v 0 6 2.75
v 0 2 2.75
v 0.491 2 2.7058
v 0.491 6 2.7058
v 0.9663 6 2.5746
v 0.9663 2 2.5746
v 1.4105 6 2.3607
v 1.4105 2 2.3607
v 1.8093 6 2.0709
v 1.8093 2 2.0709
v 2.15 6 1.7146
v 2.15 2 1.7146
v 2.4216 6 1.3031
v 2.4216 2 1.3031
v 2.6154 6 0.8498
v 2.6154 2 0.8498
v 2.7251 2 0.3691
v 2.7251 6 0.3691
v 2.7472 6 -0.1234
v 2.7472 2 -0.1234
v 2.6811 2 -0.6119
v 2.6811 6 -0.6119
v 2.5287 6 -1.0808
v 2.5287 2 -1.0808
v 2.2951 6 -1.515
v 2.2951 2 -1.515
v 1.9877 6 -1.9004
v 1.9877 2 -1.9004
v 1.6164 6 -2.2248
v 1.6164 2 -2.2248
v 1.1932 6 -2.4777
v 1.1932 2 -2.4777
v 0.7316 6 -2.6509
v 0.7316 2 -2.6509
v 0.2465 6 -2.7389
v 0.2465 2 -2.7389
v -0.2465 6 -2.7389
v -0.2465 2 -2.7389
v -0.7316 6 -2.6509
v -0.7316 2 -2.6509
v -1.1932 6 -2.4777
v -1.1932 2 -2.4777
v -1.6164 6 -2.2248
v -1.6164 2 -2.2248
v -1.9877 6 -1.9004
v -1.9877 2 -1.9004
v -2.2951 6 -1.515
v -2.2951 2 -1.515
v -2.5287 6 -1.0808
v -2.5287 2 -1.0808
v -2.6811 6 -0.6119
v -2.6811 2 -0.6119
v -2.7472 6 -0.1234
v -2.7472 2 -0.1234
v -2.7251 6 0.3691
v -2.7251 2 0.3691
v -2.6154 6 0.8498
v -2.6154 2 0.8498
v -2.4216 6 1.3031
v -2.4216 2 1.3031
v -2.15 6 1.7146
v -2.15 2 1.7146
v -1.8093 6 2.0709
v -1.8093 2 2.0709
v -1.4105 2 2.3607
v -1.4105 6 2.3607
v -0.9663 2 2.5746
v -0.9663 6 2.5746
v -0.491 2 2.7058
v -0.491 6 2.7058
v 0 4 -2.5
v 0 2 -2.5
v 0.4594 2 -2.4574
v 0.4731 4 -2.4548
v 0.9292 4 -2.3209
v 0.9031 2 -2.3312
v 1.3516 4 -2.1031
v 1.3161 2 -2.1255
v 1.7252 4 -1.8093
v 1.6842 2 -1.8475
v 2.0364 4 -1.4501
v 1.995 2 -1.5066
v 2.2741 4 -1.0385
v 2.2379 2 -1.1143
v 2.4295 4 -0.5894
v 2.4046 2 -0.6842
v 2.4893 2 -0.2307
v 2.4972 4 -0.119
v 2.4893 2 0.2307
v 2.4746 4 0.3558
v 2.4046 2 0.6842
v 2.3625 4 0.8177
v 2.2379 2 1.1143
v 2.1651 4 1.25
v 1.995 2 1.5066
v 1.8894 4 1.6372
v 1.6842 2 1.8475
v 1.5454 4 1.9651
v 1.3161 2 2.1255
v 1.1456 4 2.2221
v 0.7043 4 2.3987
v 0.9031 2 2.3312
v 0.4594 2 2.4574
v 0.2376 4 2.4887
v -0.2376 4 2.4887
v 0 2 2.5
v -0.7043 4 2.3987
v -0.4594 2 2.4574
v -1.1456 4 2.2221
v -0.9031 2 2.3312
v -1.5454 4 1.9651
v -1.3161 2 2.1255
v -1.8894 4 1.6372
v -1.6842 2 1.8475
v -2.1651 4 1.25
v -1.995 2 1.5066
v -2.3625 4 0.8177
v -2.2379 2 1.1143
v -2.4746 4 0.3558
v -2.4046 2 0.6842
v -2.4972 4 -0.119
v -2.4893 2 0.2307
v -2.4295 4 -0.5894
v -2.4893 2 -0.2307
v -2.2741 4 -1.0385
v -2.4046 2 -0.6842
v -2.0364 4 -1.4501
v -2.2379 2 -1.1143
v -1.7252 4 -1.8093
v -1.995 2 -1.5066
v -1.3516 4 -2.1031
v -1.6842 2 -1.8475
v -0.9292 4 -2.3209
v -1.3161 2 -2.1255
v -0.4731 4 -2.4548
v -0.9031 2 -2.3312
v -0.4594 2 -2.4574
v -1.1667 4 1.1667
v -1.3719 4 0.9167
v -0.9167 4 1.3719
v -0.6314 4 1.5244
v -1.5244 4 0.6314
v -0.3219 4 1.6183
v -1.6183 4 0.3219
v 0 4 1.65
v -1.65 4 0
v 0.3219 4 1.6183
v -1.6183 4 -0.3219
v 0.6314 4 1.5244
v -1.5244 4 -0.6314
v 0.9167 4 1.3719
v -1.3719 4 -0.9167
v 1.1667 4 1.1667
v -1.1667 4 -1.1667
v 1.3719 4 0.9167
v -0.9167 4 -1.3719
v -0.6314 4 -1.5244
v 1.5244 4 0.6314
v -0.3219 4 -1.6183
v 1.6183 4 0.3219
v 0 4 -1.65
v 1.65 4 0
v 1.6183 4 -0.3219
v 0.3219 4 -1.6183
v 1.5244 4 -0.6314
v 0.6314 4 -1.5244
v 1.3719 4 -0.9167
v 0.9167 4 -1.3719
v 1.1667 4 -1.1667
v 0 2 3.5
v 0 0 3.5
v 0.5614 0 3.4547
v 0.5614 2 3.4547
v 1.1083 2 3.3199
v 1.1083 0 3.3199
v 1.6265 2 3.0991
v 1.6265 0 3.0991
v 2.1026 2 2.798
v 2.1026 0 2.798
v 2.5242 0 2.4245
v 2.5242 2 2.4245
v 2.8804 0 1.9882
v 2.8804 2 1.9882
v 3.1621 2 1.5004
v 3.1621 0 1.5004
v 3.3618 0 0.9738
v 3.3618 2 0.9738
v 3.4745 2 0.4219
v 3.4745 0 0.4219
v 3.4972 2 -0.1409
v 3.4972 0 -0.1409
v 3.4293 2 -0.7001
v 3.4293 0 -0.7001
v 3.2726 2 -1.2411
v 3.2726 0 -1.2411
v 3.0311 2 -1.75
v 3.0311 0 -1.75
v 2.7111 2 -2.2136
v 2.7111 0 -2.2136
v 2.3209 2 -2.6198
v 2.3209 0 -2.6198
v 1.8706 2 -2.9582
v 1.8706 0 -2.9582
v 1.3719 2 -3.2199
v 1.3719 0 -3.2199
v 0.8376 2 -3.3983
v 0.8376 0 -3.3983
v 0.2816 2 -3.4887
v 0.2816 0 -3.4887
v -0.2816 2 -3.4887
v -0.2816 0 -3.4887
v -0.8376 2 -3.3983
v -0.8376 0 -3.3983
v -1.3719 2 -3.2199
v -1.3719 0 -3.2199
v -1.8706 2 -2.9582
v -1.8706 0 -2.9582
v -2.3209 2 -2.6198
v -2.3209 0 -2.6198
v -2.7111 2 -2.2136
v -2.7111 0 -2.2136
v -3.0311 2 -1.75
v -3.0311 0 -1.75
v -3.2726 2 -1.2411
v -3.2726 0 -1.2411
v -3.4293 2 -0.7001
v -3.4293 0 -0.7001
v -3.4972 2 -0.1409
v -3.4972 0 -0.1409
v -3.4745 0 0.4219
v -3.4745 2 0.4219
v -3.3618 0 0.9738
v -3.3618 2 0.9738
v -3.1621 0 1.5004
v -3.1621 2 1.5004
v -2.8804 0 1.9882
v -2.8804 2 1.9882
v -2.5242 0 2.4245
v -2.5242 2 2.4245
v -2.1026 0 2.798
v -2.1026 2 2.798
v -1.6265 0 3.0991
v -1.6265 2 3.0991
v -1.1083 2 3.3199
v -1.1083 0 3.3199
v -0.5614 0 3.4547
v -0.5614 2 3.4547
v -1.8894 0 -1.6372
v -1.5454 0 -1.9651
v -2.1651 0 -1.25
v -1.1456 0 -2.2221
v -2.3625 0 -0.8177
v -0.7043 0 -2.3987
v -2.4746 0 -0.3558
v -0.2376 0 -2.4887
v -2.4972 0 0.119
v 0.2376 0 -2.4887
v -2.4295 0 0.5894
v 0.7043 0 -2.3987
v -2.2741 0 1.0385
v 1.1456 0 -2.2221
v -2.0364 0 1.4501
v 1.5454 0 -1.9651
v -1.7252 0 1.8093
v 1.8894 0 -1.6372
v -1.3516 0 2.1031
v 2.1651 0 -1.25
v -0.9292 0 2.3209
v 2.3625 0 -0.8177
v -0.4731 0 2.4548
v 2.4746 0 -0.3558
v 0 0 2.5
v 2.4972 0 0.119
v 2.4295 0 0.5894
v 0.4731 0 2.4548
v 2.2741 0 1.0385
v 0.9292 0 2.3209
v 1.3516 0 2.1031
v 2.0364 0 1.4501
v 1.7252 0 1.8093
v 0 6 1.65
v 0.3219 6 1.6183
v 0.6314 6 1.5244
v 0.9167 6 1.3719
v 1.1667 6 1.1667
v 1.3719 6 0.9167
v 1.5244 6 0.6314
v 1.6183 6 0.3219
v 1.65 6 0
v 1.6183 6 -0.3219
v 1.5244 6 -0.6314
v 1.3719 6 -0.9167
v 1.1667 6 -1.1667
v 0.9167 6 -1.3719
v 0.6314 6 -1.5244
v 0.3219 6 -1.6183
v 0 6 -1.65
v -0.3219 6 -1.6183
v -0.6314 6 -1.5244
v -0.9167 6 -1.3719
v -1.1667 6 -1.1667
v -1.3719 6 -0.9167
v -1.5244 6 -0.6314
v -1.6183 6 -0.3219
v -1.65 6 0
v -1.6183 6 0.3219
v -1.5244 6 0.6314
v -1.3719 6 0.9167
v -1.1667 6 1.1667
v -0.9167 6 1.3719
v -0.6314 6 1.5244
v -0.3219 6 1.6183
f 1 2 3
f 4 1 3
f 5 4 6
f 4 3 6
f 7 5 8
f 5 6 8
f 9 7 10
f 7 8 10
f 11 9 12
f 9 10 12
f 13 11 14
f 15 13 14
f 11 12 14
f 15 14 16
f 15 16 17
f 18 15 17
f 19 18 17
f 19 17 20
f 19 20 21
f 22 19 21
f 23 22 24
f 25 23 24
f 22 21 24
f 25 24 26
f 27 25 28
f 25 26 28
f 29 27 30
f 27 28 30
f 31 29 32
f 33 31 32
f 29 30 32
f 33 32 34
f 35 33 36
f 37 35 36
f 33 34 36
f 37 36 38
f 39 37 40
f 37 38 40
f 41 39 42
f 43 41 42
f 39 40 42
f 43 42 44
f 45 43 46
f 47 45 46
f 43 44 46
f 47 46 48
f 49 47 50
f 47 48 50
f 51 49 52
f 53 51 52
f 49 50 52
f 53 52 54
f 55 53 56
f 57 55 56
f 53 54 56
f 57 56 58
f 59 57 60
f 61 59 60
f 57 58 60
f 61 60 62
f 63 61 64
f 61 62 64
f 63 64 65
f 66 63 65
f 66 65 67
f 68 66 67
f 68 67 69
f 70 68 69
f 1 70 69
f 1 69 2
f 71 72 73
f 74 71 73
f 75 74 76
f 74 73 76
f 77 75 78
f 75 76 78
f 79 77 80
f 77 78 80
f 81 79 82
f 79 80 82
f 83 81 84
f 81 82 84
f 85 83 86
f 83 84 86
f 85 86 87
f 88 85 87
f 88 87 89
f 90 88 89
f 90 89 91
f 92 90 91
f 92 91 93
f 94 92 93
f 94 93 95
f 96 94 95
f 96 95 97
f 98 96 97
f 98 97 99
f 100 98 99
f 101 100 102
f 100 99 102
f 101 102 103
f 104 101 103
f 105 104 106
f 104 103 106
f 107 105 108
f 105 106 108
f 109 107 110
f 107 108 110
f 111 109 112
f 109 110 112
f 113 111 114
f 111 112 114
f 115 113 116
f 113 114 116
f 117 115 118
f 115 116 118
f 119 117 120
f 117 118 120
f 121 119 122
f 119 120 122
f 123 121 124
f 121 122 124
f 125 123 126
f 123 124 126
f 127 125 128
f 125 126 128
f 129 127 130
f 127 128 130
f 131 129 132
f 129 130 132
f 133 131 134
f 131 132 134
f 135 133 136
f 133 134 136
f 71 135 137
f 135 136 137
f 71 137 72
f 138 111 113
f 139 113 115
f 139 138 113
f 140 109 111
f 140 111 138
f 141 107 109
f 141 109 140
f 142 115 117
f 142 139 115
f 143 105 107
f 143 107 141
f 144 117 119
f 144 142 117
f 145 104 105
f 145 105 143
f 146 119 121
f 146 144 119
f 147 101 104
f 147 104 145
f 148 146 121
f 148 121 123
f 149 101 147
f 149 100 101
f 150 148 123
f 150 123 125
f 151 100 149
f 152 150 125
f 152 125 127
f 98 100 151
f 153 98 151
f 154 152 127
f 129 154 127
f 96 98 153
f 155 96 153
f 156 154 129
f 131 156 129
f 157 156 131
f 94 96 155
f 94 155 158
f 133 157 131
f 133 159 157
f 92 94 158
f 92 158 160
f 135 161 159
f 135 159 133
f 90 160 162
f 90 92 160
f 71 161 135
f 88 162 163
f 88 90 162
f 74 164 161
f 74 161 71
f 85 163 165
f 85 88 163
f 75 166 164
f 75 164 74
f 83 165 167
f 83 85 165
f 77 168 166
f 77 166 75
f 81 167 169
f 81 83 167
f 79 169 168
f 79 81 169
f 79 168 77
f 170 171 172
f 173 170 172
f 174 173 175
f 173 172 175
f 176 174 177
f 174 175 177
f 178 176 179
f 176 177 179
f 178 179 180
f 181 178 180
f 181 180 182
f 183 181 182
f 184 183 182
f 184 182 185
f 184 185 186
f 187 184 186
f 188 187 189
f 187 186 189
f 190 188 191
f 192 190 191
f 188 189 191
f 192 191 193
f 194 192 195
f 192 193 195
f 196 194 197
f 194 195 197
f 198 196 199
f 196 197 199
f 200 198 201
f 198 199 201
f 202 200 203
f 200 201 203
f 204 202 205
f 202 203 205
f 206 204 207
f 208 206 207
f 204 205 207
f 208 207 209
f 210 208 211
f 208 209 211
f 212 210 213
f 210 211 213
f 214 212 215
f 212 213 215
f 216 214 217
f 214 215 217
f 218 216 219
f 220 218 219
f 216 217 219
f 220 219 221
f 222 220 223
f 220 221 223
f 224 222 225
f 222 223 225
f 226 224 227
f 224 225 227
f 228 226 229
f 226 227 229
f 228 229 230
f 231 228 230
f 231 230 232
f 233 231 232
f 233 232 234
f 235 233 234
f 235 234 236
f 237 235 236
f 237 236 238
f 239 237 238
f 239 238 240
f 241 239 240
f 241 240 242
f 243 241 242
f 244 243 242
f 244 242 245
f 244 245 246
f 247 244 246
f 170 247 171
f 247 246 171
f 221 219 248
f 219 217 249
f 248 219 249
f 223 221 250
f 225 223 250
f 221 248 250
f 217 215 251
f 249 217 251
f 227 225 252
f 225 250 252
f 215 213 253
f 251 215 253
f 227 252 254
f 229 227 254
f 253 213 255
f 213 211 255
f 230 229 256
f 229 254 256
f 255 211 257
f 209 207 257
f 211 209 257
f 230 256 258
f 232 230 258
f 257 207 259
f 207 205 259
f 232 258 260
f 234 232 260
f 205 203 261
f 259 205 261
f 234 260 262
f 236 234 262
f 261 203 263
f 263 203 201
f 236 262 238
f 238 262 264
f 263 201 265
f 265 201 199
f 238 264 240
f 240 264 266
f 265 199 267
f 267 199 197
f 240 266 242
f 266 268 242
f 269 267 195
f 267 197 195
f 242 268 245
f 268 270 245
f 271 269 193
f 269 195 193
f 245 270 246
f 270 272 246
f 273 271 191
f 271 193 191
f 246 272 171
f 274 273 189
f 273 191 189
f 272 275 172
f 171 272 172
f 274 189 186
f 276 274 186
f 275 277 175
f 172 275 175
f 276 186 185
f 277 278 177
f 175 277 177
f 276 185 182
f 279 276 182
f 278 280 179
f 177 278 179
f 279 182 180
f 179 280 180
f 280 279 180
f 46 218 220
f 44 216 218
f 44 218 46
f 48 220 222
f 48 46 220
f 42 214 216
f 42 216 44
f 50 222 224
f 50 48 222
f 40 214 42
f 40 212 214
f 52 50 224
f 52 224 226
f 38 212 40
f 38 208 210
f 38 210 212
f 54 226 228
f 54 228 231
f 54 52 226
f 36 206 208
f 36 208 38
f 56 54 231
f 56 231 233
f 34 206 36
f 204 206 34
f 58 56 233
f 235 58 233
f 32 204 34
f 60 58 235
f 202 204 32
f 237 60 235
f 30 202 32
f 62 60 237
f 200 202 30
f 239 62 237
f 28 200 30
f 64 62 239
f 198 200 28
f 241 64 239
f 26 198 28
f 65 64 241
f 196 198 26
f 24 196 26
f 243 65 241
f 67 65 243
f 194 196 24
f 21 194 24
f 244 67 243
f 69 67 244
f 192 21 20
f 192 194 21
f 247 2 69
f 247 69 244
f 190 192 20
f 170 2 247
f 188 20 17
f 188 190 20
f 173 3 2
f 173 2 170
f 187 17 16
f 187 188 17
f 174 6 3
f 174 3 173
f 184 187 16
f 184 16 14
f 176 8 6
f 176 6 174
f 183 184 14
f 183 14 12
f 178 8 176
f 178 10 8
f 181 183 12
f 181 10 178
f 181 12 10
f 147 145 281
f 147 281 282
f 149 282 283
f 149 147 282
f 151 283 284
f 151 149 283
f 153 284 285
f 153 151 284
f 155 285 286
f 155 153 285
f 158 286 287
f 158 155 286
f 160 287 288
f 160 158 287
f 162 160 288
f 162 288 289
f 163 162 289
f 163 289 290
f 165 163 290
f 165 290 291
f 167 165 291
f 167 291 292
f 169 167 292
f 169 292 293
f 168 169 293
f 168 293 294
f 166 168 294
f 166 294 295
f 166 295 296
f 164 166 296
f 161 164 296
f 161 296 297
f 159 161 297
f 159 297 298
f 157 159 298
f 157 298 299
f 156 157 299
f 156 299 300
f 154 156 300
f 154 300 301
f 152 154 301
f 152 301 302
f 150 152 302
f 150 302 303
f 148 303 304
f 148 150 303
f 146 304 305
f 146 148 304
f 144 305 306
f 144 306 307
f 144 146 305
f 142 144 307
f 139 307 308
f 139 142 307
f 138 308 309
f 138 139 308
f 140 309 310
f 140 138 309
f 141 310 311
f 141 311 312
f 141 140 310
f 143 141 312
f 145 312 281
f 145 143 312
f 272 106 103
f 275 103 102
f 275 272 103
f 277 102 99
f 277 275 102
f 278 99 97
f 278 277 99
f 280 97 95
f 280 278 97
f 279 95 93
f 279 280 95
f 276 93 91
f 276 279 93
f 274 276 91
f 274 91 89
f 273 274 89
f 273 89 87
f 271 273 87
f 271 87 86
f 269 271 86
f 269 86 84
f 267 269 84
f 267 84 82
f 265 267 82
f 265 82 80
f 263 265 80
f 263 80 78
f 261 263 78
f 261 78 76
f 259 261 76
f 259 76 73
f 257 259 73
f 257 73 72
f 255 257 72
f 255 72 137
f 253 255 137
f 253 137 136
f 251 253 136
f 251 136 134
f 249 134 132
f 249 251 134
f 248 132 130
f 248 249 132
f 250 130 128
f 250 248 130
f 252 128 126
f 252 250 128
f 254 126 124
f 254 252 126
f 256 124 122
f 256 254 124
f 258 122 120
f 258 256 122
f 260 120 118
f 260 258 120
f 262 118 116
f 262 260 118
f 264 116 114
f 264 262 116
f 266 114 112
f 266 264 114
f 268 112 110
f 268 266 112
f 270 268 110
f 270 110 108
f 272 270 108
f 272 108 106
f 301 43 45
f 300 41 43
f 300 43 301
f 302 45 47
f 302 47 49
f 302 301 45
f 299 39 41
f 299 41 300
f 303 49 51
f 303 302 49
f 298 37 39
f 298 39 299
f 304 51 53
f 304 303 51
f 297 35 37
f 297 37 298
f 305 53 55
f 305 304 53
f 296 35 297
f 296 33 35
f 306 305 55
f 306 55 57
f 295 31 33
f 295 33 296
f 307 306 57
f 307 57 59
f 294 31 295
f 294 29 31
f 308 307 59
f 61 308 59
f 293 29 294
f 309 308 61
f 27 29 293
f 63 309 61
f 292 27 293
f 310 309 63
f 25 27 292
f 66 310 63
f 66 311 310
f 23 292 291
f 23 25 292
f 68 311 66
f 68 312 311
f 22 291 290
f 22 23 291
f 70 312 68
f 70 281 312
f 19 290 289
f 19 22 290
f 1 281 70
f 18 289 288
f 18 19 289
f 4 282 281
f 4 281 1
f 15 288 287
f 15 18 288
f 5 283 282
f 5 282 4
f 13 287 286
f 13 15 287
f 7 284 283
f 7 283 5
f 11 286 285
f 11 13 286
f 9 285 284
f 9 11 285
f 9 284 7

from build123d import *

# Parameters (mm, degrees)
SKETCH3_R           = 3.5
SKETCH3_R_2         = 2.5
BOSS_EXTRUDE3_DEPTH = 2
SKETCH4_R           = 2.75
SKETCH4_R_2         = 1.65
BOSS_EXTRUDE4_DEPTH = 4
SKETCH5_R           = 2.5
CUT_EXTRUDE1_DEPTH  = 2


with BuildPart() as part:
    # Sketch3 → Boss-Extrude3 (new body)
    with BuildSketch(Plane(origin=(0, 0, 0), x_dir=(1, 0, 0), z_dir=(0, 1, 0))):
        with Locations(Location((0, 0, 0), (0, 0, 270))):
            Circle(SKETCH3_R)
        with Locations(Location((0, 0, 0), (0, 0, 270))):
            Circle(SKETCH3_R_2, mode=Mode.SUBTRACT)
    extrude(amount=BOSS_EXTRUDE3_DEPTH)

    # Sketch4 → Boss-Extrude4 (add)
    with BuildSketch(Plane(origin=(0, 2, 0), x_dir=(1, 0, 0), z_dir=(0, 1, 0))):
        with Locations(Location((0, 0, 0), (0, 0, 270))):
            Circle(SKETCH4_R)
        with Locations(Location((0, 0, 0), (0, 0, 270))):
            Circle(SKETCH4_R_2, mode=Mode.SUBTRACT)
    extrude(amount=BOSS_EXTRUDE4_DEPTH)

    # Sketch5 → Cut-Extrude1 (cut)
    with BuildSketch(Plane.XZ.offset(-2)):
        with Locations(Location((0, 0, 0), (0, 0, 270))):
            Circle(SKETCH5_R)
    extrude(amount=-CUT_EXTRUDE1_DEPTH, mode=Mode.SUBTRACT)


solid = part.part
